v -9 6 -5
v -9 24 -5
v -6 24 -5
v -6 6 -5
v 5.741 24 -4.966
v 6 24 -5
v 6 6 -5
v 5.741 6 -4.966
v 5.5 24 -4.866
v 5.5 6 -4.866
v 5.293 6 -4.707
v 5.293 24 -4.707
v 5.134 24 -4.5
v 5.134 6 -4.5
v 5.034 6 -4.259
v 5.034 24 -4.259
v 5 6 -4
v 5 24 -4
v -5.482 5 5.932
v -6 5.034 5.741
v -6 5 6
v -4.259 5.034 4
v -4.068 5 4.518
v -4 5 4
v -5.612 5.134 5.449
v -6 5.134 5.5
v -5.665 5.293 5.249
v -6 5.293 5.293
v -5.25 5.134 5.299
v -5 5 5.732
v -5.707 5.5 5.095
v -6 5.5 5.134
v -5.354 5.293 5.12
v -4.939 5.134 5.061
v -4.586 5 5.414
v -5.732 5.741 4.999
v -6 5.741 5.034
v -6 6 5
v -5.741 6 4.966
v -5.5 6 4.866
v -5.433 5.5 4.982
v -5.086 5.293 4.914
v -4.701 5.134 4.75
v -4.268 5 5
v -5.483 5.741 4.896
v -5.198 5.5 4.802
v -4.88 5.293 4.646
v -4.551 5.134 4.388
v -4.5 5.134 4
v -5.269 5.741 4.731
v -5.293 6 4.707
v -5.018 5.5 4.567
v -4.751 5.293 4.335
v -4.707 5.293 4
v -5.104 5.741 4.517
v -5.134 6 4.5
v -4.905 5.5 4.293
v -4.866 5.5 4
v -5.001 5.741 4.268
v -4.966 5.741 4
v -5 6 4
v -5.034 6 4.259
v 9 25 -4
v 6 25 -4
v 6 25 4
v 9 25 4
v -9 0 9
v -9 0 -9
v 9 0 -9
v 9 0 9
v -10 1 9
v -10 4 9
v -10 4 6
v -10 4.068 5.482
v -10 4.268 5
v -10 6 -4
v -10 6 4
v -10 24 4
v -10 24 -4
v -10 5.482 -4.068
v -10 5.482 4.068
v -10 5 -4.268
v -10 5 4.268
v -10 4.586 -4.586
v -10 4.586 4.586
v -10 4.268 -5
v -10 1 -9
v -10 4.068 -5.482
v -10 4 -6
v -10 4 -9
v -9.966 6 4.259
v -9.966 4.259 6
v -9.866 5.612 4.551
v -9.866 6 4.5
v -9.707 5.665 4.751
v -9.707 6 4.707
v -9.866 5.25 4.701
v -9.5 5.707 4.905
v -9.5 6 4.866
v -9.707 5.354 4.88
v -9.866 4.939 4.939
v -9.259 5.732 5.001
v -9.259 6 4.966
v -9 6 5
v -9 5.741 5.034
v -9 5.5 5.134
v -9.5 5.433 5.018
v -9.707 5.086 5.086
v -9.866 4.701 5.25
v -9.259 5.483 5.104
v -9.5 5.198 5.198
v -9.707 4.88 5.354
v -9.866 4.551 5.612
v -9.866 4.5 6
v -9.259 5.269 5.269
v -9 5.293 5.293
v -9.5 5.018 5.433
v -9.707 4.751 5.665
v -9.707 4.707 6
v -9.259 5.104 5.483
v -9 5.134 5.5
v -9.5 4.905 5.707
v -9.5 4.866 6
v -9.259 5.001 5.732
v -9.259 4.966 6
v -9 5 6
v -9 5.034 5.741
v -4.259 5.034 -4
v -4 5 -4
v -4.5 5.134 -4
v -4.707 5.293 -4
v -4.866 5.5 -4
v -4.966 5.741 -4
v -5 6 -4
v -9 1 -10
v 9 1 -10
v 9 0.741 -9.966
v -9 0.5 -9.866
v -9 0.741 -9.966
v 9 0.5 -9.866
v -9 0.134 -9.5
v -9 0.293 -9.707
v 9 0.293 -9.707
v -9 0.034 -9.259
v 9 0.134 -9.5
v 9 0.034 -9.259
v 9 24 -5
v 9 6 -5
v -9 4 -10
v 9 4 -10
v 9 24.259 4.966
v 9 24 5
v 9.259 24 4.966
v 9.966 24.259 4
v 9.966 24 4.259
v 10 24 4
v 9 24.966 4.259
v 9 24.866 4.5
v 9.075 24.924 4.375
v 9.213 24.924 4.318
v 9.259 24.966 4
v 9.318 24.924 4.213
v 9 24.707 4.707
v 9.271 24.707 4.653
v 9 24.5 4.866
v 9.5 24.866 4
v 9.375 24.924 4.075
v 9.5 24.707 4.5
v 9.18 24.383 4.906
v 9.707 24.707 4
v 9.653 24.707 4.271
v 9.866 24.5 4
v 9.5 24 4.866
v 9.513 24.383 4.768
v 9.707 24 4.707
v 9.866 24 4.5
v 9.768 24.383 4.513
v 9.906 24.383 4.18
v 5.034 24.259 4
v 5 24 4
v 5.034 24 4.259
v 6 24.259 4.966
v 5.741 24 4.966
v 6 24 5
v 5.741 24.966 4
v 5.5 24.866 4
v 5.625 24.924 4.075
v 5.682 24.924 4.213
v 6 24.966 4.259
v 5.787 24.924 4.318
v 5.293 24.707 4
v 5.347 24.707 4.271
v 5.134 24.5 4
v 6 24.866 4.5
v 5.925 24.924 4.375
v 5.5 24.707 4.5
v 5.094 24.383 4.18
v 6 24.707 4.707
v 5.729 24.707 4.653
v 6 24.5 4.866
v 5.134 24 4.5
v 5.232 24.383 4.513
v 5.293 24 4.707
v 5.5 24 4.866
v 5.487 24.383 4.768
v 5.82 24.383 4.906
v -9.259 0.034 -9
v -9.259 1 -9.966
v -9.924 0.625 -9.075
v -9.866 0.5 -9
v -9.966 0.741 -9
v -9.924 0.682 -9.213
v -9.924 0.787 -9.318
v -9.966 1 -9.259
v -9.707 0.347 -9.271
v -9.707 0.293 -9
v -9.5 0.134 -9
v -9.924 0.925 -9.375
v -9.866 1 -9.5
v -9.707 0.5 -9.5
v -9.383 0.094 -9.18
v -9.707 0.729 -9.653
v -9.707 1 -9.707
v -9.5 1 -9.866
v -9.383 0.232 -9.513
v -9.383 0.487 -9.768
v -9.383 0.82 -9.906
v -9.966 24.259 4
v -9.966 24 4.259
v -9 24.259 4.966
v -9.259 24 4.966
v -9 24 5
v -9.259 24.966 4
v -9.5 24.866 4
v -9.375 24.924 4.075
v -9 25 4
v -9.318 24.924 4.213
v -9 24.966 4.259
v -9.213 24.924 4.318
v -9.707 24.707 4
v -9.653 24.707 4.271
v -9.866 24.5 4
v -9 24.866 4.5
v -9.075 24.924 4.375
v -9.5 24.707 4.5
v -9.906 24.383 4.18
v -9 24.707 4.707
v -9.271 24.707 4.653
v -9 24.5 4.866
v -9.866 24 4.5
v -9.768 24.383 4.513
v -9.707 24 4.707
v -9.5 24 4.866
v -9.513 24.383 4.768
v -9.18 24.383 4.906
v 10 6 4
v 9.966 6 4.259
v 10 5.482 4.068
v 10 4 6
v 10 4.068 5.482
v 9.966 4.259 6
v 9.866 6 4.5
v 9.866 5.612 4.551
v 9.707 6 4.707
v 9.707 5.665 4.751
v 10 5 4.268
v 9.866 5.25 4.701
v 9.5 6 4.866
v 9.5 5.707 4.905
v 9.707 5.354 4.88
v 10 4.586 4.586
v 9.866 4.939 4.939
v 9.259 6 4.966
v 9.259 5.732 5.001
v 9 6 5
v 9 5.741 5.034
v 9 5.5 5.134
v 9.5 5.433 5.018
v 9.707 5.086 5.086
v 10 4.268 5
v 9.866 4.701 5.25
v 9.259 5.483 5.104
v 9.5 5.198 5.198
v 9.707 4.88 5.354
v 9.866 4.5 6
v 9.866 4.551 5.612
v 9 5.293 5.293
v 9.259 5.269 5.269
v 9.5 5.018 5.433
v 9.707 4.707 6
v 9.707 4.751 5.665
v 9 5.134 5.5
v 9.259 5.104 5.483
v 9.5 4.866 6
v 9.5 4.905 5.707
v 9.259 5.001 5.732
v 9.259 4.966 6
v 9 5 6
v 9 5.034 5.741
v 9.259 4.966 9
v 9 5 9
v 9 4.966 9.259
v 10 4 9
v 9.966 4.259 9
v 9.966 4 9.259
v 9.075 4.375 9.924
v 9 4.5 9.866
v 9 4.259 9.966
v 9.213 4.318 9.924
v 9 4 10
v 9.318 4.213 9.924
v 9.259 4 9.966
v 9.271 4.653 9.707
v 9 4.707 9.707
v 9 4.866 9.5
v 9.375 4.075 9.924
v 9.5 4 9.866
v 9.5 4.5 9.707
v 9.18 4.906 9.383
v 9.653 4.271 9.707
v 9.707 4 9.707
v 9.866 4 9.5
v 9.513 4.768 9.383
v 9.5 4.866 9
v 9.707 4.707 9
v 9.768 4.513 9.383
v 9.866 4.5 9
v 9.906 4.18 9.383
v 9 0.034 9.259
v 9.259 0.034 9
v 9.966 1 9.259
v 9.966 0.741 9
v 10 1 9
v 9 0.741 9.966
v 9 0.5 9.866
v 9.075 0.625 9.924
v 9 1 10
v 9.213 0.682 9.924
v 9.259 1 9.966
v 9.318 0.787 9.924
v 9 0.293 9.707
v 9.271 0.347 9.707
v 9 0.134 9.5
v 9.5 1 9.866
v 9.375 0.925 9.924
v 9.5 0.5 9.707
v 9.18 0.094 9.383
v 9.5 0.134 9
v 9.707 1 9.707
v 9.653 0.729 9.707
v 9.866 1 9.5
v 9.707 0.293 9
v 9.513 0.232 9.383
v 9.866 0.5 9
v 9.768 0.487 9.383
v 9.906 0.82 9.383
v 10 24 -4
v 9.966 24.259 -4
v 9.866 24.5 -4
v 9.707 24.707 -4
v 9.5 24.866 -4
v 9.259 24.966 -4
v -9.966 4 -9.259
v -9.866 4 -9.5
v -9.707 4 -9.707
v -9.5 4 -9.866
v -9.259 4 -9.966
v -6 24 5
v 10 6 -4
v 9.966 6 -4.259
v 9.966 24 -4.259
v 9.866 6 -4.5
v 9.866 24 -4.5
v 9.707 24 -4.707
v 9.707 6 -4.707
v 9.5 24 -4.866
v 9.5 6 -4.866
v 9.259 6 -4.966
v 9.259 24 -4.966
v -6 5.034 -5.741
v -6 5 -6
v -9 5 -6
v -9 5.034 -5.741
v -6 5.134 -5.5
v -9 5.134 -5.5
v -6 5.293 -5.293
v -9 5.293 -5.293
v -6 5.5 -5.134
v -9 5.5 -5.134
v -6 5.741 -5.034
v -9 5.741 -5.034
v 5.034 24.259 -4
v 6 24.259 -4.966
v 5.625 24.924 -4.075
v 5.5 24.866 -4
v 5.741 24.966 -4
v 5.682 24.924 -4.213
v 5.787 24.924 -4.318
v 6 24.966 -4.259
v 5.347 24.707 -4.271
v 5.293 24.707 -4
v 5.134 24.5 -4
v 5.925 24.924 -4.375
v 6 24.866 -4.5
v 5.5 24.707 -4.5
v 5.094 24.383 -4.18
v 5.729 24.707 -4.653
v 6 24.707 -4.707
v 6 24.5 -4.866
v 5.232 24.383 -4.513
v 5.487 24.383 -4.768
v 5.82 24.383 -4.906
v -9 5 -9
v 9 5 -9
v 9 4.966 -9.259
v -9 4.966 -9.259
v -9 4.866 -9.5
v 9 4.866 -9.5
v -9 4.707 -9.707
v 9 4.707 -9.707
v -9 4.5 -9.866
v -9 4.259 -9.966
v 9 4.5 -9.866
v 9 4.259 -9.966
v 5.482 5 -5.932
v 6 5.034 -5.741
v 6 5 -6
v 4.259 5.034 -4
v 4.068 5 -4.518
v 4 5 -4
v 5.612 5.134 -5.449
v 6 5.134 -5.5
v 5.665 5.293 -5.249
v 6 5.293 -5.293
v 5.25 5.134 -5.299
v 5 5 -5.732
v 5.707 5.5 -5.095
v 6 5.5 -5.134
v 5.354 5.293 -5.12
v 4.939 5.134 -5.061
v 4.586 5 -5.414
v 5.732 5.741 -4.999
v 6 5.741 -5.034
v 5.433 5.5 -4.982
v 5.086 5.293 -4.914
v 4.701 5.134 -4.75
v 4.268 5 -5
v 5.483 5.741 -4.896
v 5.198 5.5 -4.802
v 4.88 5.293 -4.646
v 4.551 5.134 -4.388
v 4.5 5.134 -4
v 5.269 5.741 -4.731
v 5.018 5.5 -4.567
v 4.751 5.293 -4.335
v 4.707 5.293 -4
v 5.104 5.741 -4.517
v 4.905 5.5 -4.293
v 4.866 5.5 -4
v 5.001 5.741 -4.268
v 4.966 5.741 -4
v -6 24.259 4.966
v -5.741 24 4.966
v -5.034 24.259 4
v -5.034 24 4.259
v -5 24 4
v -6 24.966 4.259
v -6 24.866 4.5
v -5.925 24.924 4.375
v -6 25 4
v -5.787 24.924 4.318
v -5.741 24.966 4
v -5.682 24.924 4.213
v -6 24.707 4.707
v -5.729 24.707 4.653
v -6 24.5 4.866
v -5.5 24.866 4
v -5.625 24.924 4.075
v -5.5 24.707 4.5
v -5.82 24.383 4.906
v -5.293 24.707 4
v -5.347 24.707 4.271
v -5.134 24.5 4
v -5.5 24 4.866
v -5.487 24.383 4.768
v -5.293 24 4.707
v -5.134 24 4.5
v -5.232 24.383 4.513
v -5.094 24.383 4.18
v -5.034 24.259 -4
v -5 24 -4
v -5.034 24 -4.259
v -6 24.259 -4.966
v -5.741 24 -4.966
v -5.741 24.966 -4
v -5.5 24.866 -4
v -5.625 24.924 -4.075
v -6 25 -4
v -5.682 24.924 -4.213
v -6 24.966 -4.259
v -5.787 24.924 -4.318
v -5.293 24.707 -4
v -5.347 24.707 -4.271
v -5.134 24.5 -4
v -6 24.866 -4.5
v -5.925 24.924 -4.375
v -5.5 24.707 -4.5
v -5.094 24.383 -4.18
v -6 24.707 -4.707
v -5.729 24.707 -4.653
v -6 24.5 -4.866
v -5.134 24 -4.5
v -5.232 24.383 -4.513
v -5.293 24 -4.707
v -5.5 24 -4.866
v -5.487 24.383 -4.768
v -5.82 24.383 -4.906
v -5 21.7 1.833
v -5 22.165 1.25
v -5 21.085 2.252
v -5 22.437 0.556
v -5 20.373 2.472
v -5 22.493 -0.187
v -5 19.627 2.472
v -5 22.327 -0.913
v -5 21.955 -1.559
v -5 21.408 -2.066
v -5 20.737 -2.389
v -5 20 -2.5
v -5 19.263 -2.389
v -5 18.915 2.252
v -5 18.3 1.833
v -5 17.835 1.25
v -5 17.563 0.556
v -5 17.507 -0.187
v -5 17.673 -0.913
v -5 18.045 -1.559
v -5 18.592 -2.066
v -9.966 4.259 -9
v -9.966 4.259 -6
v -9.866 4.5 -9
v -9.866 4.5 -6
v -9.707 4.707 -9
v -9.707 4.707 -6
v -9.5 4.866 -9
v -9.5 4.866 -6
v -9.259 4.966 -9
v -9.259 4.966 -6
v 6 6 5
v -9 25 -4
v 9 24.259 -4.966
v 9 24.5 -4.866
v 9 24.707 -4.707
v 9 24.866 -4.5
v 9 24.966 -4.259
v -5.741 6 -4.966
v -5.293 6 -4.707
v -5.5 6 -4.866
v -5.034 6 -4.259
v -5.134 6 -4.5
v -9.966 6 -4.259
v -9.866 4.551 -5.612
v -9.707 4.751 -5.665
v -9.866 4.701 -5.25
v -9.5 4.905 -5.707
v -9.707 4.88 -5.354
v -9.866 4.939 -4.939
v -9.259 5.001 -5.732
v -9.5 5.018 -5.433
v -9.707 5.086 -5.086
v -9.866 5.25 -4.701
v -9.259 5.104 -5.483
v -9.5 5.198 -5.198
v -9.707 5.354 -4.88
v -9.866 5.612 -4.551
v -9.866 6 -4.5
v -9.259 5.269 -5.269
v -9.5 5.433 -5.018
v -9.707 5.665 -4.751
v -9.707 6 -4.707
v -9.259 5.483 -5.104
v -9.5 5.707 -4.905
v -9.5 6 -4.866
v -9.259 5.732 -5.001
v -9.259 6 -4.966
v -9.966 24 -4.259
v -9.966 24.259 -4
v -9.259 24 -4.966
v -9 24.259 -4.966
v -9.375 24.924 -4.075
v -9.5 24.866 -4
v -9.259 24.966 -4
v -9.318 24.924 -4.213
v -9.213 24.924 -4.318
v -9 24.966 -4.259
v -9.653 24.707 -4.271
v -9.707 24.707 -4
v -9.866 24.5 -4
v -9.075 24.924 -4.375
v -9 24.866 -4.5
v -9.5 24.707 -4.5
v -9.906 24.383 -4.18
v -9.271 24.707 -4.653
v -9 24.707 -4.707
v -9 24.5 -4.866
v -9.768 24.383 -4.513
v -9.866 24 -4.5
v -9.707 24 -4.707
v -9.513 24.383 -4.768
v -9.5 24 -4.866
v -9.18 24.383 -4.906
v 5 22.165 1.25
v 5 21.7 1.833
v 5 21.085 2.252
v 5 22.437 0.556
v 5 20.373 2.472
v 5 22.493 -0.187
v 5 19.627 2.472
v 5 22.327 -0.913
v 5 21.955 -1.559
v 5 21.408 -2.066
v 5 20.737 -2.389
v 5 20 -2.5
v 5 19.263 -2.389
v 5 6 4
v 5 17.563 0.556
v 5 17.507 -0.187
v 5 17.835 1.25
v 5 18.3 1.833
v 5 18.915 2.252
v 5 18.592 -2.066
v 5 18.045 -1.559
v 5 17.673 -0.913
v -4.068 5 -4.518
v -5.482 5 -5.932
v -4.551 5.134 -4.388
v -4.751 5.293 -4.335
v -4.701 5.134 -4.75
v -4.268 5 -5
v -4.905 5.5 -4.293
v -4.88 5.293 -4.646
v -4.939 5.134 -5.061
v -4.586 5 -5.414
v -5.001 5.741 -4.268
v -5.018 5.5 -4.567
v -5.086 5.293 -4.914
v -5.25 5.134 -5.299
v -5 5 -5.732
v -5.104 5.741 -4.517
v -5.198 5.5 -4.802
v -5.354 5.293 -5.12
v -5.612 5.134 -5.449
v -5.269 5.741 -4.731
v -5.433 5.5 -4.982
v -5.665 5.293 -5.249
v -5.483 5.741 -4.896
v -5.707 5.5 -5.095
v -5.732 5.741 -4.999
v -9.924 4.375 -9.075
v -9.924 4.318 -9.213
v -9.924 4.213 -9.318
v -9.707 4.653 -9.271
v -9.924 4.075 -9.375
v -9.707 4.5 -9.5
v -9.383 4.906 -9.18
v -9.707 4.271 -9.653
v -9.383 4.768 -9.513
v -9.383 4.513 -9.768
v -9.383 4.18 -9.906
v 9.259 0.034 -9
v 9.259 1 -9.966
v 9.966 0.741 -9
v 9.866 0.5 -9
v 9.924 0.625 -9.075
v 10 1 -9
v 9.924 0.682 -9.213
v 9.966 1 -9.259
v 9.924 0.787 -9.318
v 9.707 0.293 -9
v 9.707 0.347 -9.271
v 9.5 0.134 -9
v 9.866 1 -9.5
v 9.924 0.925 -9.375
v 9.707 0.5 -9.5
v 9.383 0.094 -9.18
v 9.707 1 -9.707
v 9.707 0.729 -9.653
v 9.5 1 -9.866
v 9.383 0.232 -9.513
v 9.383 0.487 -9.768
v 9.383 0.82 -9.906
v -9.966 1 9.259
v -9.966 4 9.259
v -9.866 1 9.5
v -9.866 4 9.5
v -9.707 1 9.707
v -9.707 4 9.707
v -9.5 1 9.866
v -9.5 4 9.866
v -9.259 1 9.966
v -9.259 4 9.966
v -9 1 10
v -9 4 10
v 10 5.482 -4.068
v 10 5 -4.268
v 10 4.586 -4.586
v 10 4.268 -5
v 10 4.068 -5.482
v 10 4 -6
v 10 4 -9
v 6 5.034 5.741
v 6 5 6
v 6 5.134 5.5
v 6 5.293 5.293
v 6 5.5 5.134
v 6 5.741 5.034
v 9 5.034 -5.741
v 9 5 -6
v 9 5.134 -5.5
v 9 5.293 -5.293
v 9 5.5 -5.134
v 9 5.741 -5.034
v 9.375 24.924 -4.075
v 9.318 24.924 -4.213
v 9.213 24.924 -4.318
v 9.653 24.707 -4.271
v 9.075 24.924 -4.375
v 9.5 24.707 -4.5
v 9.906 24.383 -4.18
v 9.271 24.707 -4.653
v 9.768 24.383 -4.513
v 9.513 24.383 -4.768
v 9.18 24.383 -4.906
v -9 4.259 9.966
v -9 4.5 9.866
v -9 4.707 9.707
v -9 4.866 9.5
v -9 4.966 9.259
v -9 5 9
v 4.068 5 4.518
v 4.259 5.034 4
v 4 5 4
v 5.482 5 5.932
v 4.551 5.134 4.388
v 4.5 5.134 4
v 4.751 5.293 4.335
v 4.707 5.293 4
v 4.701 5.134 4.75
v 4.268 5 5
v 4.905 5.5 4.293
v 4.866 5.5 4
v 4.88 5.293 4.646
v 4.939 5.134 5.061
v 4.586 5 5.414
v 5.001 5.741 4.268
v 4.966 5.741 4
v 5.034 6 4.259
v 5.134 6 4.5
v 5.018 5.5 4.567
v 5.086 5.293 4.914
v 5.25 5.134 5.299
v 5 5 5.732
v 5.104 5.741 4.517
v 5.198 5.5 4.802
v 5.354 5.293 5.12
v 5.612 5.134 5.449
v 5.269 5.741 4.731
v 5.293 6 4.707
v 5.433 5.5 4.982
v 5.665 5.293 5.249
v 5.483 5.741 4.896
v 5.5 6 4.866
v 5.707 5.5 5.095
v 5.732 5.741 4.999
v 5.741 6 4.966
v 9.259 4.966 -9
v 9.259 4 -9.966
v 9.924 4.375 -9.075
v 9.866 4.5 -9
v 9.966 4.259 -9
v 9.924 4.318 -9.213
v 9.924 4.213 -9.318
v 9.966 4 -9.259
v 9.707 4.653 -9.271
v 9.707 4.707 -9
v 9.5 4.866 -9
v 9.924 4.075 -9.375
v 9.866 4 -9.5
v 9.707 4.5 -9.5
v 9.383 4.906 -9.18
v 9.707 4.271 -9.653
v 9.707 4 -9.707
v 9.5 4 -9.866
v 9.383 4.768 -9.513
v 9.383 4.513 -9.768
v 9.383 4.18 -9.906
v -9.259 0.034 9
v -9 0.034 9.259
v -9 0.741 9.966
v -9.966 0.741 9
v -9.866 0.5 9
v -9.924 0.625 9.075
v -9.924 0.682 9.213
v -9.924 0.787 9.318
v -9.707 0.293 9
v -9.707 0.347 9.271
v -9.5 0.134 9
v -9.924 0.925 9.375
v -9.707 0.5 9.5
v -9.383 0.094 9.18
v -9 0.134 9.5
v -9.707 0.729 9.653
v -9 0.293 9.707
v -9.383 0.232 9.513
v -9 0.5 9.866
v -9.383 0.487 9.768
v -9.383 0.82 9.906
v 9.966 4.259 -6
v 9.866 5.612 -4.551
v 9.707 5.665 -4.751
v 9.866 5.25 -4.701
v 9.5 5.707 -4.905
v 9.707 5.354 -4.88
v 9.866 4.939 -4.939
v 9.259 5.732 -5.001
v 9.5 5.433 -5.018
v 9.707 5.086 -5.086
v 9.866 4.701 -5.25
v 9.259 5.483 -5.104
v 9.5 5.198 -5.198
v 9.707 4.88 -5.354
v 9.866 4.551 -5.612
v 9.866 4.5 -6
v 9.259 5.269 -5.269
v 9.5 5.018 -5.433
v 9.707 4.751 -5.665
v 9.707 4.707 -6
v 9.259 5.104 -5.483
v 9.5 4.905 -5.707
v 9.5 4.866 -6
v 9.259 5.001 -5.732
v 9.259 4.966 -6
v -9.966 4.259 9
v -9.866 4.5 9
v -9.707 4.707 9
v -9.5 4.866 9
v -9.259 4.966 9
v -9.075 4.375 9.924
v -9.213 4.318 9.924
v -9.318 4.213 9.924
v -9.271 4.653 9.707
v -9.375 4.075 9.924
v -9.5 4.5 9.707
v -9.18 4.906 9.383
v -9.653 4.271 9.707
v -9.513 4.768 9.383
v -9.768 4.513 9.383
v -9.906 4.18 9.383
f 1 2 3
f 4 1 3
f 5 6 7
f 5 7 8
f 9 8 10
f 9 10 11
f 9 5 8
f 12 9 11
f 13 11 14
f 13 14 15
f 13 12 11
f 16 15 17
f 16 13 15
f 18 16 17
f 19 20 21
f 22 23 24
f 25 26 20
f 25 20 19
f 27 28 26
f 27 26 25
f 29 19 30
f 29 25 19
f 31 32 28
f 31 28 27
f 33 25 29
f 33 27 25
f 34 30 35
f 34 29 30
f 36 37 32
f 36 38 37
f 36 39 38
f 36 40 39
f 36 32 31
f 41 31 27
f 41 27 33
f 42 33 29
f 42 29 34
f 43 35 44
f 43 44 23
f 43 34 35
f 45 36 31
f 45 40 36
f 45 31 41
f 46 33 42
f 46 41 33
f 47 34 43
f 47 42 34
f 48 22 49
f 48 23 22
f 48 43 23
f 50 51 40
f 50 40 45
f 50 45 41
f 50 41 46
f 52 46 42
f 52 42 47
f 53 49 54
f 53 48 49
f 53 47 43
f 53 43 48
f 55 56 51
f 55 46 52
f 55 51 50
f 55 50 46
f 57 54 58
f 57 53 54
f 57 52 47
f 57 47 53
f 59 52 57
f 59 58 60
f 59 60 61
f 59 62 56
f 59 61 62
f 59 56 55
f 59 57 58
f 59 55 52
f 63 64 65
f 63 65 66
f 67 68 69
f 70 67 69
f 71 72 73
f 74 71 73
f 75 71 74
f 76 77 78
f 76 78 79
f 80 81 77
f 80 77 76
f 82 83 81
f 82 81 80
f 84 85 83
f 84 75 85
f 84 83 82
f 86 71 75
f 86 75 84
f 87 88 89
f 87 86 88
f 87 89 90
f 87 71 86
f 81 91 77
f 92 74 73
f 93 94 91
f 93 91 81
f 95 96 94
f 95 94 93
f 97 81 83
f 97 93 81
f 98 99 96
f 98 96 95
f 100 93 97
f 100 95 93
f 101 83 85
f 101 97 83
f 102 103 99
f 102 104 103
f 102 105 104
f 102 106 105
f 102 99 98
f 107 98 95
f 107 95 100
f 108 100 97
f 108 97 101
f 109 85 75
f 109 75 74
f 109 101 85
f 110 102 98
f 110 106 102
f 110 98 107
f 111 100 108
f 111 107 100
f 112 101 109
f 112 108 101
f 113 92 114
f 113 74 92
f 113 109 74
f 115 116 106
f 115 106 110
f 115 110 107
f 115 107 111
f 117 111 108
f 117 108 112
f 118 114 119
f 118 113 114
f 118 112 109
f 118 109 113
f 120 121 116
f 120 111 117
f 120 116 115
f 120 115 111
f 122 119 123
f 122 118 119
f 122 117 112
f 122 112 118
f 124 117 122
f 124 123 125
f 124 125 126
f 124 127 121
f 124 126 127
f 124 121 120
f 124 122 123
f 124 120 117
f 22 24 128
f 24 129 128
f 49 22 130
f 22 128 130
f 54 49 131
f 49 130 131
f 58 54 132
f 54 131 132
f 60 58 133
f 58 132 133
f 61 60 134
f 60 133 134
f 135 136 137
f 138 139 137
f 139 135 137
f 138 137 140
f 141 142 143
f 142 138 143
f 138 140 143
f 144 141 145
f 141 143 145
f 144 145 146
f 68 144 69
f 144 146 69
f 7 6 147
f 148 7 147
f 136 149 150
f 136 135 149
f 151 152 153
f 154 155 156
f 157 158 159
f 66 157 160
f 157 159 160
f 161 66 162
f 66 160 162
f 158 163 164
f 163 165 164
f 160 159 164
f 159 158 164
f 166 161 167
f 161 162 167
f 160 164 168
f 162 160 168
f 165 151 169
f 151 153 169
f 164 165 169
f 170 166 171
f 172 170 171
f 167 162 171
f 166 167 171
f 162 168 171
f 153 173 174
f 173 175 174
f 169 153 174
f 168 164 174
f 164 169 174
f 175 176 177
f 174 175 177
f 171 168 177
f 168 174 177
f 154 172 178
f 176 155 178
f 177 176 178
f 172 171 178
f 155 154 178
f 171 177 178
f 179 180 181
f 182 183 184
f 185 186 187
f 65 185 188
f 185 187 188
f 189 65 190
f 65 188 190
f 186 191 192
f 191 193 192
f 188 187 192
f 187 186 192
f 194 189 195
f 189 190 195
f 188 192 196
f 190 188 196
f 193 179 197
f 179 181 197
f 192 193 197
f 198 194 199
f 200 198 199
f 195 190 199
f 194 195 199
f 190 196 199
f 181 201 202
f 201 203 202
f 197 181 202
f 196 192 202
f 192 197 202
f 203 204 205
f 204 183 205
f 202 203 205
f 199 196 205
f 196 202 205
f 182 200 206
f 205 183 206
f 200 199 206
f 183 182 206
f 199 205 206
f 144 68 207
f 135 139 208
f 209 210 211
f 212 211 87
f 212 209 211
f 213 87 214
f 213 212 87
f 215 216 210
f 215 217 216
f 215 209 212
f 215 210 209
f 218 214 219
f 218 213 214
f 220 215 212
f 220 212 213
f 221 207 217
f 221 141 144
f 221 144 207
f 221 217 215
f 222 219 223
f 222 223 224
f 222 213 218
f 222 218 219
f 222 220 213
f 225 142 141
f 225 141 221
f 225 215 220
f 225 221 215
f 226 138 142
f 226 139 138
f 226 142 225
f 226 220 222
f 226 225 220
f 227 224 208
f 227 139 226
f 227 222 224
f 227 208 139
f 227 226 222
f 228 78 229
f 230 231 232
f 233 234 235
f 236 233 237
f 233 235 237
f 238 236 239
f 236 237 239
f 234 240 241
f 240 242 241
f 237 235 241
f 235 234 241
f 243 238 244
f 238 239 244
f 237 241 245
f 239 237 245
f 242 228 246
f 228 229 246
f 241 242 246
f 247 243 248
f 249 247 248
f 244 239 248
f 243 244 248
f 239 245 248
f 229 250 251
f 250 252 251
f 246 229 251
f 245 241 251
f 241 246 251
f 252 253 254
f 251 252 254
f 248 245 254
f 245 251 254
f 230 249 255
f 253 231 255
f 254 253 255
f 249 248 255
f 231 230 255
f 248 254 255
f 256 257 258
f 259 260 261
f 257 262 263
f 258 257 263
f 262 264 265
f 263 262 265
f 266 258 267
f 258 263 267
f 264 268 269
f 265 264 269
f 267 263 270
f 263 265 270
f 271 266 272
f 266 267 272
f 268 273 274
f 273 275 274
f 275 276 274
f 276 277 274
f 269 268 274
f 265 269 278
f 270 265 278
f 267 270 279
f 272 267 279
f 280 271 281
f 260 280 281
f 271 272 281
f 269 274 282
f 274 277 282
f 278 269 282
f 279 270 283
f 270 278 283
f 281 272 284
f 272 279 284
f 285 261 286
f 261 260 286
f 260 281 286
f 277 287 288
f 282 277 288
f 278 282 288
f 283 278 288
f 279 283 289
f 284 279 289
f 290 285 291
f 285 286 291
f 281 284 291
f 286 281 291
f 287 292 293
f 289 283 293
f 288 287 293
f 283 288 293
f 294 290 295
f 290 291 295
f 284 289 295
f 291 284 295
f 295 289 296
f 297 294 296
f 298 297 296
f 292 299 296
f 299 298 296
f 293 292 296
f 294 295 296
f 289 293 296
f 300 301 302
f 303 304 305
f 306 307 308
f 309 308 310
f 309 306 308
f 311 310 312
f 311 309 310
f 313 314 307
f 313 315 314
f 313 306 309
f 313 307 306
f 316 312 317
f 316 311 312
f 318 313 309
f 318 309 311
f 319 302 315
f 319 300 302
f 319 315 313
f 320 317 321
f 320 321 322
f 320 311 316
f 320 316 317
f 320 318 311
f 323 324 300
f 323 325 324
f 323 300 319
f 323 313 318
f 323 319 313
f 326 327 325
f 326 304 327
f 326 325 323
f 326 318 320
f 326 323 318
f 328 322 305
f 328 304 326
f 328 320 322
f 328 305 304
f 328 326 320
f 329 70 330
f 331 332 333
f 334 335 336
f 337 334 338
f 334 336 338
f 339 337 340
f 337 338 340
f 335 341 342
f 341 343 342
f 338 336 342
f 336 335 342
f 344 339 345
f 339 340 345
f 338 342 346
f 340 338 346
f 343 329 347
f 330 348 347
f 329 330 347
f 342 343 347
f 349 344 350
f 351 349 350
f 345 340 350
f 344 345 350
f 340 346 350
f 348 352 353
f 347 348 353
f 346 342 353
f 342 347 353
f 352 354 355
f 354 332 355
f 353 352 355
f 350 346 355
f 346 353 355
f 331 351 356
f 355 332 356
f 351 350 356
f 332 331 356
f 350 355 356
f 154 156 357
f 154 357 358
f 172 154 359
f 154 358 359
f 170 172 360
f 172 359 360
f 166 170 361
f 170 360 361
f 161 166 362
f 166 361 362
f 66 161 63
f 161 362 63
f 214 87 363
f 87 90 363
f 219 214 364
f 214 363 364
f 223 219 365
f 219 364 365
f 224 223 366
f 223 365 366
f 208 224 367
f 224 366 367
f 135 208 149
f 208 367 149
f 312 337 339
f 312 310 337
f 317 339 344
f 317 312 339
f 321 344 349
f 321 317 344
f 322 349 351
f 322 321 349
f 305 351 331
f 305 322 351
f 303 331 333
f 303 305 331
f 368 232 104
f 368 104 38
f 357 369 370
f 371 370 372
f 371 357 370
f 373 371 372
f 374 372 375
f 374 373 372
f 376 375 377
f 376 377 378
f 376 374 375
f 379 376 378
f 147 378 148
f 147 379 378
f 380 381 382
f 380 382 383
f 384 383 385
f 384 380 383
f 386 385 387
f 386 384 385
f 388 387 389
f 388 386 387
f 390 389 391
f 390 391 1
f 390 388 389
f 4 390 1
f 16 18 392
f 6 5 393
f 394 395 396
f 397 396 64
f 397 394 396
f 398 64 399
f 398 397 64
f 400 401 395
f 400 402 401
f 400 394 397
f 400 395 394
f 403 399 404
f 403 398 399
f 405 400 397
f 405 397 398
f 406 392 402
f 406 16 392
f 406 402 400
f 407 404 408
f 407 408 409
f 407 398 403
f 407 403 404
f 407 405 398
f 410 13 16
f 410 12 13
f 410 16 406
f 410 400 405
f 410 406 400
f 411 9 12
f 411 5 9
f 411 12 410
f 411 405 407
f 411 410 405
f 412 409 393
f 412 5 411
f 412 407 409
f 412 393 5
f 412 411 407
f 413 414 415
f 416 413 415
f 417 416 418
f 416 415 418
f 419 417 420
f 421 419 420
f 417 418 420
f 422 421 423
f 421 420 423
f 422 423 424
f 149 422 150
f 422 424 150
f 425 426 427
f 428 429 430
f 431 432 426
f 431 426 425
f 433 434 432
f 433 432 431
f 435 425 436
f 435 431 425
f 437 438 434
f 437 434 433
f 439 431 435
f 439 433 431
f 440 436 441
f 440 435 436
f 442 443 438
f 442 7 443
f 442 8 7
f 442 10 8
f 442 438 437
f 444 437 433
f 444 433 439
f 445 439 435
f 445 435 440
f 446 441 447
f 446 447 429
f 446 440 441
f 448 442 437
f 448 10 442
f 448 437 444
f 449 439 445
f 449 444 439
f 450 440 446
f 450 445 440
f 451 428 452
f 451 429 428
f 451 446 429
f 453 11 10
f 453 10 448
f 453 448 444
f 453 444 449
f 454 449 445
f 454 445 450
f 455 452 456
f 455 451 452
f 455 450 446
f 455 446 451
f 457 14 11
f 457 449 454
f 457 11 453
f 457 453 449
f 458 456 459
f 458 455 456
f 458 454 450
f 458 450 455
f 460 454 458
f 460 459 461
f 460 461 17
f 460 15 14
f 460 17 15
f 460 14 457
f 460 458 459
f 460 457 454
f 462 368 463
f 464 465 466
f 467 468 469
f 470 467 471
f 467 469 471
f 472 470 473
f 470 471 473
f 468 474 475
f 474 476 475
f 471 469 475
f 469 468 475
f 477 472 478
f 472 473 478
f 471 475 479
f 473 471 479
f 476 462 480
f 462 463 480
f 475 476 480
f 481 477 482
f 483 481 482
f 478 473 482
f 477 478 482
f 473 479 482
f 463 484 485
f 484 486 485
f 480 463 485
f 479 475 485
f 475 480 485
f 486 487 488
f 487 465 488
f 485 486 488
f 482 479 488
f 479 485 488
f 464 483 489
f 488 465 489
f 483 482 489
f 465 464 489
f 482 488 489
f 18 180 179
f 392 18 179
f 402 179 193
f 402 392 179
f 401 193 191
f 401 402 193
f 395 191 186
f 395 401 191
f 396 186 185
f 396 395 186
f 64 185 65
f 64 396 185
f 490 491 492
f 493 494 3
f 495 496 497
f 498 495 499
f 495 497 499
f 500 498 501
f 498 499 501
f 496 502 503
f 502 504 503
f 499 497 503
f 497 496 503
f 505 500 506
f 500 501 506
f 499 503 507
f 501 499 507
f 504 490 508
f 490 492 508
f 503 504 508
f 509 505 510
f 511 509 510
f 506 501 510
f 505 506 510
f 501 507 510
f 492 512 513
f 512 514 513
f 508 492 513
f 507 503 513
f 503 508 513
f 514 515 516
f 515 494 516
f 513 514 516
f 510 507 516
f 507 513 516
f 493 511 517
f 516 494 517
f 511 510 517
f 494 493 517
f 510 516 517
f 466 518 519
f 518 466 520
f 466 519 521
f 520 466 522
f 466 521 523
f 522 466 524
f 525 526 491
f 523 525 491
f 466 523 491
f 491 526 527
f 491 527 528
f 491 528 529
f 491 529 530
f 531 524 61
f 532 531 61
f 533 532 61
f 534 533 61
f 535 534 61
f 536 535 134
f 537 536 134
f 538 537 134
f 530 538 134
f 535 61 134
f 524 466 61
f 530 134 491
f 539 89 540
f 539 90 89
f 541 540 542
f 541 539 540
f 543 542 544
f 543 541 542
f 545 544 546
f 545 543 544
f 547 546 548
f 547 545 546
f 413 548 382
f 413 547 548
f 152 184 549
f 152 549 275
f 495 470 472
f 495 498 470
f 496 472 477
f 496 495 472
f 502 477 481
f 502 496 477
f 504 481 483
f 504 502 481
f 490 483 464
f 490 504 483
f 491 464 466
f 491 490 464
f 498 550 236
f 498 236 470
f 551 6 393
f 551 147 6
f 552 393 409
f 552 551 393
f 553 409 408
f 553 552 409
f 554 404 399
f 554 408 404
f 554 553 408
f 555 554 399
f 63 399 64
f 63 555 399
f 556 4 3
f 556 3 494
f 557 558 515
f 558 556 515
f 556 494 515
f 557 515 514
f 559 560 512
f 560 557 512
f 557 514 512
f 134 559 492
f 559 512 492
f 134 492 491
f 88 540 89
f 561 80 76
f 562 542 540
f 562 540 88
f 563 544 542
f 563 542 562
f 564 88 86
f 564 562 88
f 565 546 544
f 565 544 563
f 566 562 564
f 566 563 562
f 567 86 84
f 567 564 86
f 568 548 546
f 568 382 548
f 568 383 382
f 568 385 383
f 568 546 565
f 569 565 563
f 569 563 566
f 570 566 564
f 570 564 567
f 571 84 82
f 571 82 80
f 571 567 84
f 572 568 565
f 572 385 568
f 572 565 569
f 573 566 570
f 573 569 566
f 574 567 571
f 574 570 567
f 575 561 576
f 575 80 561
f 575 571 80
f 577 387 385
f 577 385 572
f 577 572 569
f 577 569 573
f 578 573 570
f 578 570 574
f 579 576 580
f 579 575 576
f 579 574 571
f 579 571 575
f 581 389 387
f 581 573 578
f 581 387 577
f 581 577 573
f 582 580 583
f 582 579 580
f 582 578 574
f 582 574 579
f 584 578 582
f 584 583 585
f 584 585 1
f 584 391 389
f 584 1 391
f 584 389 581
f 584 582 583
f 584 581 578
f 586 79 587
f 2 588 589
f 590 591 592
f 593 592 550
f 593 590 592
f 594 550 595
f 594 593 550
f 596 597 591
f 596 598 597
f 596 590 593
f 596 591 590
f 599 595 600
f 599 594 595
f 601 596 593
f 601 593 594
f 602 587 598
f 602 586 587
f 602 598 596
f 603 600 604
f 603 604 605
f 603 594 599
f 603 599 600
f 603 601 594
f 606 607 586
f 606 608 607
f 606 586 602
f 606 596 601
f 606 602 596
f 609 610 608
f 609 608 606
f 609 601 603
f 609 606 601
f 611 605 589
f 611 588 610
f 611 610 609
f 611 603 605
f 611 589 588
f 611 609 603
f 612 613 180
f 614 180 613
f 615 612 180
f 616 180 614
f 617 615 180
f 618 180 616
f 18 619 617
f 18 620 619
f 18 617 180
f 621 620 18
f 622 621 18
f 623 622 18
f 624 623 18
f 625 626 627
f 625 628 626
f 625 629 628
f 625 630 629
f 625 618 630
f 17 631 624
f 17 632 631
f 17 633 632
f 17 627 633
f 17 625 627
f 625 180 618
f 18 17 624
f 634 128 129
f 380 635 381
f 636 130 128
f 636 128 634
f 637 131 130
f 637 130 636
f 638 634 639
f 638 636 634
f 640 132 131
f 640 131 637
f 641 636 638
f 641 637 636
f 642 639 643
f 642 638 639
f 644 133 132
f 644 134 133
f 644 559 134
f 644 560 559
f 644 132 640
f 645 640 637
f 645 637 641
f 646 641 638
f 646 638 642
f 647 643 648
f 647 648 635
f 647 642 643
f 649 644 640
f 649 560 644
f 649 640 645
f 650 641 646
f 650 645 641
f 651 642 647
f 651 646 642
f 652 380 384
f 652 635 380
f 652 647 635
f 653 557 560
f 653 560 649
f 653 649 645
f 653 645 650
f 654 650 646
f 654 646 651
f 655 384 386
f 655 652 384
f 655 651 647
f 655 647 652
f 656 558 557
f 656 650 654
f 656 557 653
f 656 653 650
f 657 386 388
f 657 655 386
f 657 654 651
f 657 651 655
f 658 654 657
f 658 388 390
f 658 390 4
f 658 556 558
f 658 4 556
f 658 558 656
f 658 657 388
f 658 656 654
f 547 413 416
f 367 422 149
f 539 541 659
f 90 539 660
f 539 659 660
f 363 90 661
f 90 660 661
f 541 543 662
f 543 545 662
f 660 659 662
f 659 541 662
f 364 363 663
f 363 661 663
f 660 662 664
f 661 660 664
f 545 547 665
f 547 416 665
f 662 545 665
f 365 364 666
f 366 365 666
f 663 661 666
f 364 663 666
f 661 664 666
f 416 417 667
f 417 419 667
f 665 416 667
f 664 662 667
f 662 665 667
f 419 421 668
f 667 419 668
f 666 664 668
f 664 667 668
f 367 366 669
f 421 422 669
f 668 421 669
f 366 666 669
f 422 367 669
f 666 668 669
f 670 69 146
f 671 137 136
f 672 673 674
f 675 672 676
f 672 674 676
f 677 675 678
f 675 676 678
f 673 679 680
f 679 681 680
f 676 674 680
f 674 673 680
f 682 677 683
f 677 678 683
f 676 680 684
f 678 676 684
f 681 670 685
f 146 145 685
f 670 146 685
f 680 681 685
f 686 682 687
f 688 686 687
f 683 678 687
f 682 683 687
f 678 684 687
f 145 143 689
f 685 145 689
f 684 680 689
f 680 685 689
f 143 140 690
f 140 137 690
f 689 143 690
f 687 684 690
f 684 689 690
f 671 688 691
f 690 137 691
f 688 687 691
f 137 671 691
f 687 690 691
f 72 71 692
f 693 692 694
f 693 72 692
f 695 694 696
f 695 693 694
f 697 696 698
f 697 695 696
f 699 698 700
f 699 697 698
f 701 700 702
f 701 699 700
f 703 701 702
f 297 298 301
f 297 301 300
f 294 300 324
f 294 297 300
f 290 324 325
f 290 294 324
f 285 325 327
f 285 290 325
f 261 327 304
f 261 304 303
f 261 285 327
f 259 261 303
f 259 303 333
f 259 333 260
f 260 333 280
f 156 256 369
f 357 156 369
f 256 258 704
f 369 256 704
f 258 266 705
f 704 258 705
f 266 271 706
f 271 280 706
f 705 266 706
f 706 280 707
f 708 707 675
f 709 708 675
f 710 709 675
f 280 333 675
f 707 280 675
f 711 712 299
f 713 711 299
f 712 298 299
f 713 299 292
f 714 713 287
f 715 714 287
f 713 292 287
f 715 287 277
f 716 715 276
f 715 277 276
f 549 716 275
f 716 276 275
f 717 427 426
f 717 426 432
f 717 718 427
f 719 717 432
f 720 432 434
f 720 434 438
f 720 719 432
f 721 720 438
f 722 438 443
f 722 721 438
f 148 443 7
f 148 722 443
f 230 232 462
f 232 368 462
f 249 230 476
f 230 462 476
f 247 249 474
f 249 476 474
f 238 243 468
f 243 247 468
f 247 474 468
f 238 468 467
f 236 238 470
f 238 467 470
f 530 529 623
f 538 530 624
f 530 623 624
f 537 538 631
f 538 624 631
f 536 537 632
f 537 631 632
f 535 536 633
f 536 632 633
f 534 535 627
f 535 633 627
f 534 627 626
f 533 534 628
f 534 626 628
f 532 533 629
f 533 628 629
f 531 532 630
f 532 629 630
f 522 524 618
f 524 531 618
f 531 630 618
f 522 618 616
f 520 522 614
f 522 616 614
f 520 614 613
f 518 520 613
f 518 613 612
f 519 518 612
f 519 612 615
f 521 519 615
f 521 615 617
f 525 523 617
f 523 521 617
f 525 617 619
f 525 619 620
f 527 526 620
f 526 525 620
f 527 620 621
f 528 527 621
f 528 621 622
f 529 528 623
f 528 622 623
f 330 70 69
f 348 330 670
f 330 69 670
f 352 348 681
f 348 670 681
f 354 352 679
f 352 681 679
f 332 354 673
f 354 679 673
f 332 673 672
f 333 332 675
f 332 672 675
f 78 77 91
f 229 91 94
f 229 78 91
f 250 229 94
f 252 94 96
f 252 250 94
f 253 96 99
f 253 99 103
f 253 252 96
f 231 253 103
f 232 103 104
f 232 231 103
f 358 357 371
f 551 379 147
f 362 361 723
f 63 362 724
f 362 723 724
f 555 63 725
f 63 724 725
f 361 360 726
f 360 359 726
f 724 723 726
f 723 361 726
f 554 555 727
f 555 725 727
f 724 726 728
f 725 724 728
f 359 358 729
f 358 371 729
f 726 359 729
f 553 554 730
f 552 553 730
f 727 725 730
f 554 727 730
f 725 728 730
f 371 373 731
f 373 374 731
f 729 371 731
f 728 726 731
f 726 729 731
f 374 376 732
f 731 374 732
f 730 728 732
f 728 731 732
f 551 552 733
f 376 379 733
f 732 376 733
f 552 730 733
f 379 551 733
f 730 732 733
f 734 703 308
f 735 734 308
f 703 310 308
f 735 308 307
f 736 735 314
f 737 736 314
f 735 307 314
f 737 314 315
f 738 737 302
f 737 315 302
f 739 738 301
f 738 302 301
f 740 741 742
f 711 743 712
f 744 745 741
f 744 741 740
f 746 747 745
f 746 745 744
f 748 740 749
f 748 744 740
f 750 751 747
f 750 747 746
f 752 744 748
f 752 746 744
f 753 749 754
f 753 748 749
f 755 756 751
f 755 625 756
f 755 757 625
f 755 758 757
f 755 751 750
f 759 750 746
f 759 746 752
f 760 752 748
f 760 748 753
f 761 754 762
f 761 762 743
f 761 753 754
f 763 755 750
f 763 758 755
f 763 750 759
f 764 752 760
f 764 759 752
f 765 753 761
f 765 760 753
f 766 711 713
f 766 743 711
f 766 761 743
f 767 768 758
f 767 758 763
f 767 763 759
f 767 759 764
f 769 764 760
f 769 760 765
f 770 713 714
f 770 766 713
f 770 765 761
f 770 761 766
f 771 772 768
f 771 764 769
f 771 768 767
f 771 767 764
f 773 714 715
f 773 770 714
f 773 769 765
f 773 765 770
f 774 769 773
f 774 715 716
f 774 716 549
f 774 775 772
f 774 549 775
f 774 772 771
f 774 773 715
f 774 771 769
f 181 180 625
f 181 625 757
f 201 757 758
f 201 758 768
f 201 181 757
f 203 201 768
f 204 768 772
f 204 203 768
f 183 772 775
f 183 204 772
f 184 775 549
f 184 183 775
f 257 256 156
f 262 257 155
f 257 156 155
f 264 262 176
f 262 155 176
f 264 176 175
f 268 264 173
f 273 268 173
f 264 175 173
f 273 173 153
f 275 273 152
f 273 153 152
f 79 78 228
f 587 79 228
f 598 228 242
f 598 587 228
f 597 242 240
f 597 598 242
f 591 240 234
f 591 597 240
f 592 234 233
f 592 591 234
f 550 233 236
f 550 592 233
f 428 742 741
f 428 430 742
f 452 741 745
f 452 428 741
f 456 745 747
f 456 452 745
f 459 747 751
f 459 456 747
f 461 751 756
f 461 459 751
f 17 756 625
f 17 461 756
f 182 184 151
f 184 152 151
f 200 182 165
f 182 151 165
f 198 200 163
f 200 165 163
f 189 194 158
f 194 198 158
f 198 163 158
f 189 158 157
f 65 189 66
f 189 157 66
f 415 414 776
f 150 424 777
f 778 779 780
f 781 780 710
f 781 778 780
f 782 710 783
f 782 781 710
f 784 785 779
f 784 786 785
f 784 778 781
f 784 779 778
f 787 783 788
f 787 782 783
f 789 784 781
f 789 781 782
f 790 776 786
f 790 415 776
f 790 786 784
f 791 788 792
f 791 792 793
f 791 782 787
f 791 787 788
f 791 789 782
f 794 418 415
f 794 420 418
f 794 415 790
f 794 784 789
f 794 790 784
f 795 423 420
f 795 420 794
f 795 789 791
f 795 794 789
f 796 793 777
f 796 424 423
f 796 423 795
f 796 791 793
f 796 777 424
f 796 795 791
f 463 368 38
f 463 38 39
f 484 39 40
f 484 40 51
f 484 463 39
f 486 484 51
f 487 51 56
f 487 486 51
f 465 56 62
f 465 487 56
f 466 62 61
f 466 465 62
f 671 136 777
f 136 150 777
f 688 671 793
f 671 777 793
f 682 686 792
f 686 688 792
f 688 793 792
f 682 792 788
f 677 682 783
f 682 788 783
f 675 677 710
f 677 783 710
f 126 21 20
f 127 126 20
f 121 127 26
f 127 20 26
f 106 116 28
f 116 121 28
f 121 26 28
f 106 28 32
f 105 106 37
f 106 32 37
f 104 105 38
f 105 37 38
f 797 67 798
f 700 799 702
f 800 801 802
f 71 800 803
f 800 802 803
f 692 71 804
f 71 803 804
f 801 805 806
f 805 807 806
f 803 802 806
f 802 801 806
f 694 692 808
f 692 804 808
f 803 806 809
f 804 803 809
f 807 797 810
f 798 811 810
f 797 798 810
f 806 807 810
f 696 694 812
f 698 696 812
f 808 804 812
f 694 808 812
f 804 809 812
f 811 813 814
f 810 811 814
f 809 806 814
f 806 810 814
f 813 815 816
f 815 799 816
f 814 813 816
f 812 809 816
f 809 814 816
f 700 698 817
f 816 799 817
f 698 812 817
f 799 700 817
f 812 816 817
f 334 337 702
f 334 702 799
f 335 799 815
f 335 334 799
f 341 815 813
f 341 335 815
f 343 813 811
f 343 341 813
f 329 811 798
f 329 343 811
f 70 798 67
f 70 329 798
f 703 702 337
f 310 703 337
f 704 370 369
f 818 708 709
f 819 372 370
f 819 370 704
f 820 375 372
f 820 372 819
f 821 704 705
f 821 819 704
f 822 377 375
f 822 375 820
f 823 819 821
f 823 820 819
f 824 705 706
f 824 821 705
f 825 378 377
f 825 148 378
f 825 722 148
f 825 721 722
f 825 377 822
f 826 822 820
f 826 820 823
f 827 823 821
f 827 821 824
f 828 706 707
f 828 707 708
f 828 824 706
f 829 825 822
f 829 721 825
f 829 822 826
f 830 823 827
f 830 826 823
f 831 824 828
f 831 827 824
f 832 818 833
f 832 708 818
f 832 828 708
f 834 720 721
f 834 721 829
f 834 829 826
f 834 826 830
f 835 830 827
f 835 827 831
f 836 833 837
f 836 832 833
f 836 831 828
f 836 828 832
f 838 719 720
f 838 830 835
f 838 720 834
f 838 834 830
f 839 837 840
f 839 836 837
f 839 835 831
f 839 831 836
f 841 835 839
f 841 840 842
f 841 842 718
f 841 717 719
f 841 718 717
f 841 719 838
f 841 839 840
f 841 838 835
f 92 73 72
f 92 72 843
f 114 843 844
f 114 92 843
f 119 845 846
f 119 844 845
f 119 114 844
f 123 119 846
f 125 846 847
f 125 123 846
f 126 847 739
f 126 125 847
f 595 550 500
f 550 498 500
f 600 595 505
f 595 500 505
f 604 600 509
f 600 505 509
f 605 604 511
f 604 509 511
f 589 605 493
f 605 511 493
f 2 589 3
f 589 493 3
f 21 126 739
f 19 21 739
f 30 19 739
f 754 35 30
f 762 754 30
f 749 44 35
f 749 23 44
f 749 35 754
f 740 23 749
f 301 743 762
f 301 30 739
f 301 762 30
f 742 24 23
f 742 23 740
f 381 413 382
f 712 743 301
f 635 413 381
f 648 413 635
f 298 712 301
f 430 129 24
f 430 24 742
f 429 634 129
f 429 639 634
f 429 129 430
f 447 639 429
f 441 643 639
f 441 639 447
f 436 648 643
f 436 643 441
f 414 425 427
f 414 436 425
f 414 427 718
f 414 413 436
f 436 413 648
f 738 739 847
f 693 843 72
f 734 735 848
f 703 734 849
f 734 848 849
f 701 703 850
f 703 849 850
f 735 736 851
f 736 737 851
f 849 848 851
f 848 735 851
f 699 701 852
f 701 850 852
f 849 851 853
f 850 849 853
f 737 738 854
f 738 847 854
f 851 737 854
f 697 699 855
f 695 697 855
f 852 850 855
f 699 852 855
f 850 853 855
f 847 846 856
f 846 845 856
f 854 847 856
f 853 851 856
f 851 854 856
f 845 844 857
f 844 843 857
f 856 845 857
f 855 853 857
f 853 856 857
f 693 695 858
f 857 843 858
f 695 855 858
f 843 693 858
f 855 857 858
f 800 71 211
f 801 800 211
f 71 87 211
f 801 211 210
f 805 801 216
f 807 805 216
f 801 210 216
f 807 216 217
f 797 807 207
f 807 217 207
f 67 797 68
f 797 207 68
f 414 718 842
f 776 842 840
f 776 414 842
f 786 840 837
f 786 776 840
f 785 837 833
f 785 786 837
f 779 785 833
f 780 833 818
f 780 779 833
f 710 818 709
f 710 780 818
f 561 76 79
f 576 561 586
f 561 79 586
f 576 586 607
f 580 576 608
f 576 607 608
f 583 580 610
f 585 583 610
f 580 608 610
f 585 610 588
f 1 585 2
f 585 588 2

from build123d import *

# Parameters (mm, degrees)
CROQUIS1_W              = 20
CROQUIS1_H              = 20
SALIENTE_EXTRUIR1_DEPTH = 5
CROQUIS2_W              = 5
CROQUIS2_H              = 10
SALIENTE_EXTRUIR2_DEPTH = 20
SALIENTE_EXTRUIR3_REACH = 32.822
CROQUIS3_R              = 2.5
REDONDEO4_R             = 1


with BuildPart() as part:
    # Croquis1 → Saliente-Extruir1 (new body)
    with BuildSketch(Plane(origin=(0, 0, 0), x_dir=(1, 0, 0), z_dir=(0, 1, 0))):
        Rectangle(CROQUIS1_W, CROQUIS1_H)
    extrude(amount=SALIENTE_EXTRUIR1_DEPTH)

    # Croquis2 → Saliente-Extruir2 (add)
    with BuildSketch(Plane(origin=(0, 5, 0), x_dir=(1, 0, 0), z_dir=(0, 1, 0))):
        with Locations((-7.5, 0)):
            Rectangle(CROQUIS2_W, CROQUIS2_H)
        with Locations((7.5, 0)):
            Rectangle(CROQUIS2_W, CROQUIS2_H)
    extrude(amount=SALIENTE_EXTRUIR2_DEPTH)

    # Croquis3 → Saliente-Extruir3 (add, up to next)
    with BuildSketch(Plane.ZY.offset(-5), mode=Mode.PRIVATE) as saliente_extruir3_sk1:
        with Locations(Location((0, 20, 0), (0, 0, 180))):
            Circle(CROQUIS3_R)
    saliente_extruir3_tool1 = extrude(saliente_extruir3_sk1.sketch, amount=SALIENTE_EXTRUIR3_REACH, mode=Mode.PRIVATE) - part.part
    add(saliente_extruir3_tool1.solids().sort_by_distance((5, 20, 0))[0])

    # Redondeo4
    redondeo4_edges = [part.edges().sort_by_distance(p)[0] for p in [
        (10, 5, 7.5),
        (0, 5, -10),
        (-10, 5, 7.5),
        (-10, 15, -5),
        (-7.5, 5, 5),
        (-10, 15, 5),
        (-5, 5, 0),
        (-5, 15, 5),
        (-7.5, 5, -5),
        (-5, 15, -5),
        (-10, 25, 0),
        (-7.5, 25, 5),
        (-5, 25, 0),
        (-7.5, 25, -5),
        (10, 5, -7.5),
        (5, 5, 0),
        (5, 15, -5),
        (7.5, 5, 5),
        (5, 15, 5),
        (10, 15, 5),
        (7.5, 5, -5),
        (10, 15, -5),
        (5, 25, 0),
        (7.5, 25, 5),
        (10, 25, 0),
        (7.5, 25, -5),
        (-10, 5, -7.5),
        (0, 0, -10),
        (10, 0, 0),
        (0, 0, 10),
        (-10, 0, 0),
        (0, 5, 10),
        (-10, 2.5, -10),
        (10, 2.5, -10),
        (10, 2.5, 10),
        (-10, 2.5, 10),
    ]]
    fillet(redondeo4_edges, radius=REDONDEO4_R)


solid = part.part
